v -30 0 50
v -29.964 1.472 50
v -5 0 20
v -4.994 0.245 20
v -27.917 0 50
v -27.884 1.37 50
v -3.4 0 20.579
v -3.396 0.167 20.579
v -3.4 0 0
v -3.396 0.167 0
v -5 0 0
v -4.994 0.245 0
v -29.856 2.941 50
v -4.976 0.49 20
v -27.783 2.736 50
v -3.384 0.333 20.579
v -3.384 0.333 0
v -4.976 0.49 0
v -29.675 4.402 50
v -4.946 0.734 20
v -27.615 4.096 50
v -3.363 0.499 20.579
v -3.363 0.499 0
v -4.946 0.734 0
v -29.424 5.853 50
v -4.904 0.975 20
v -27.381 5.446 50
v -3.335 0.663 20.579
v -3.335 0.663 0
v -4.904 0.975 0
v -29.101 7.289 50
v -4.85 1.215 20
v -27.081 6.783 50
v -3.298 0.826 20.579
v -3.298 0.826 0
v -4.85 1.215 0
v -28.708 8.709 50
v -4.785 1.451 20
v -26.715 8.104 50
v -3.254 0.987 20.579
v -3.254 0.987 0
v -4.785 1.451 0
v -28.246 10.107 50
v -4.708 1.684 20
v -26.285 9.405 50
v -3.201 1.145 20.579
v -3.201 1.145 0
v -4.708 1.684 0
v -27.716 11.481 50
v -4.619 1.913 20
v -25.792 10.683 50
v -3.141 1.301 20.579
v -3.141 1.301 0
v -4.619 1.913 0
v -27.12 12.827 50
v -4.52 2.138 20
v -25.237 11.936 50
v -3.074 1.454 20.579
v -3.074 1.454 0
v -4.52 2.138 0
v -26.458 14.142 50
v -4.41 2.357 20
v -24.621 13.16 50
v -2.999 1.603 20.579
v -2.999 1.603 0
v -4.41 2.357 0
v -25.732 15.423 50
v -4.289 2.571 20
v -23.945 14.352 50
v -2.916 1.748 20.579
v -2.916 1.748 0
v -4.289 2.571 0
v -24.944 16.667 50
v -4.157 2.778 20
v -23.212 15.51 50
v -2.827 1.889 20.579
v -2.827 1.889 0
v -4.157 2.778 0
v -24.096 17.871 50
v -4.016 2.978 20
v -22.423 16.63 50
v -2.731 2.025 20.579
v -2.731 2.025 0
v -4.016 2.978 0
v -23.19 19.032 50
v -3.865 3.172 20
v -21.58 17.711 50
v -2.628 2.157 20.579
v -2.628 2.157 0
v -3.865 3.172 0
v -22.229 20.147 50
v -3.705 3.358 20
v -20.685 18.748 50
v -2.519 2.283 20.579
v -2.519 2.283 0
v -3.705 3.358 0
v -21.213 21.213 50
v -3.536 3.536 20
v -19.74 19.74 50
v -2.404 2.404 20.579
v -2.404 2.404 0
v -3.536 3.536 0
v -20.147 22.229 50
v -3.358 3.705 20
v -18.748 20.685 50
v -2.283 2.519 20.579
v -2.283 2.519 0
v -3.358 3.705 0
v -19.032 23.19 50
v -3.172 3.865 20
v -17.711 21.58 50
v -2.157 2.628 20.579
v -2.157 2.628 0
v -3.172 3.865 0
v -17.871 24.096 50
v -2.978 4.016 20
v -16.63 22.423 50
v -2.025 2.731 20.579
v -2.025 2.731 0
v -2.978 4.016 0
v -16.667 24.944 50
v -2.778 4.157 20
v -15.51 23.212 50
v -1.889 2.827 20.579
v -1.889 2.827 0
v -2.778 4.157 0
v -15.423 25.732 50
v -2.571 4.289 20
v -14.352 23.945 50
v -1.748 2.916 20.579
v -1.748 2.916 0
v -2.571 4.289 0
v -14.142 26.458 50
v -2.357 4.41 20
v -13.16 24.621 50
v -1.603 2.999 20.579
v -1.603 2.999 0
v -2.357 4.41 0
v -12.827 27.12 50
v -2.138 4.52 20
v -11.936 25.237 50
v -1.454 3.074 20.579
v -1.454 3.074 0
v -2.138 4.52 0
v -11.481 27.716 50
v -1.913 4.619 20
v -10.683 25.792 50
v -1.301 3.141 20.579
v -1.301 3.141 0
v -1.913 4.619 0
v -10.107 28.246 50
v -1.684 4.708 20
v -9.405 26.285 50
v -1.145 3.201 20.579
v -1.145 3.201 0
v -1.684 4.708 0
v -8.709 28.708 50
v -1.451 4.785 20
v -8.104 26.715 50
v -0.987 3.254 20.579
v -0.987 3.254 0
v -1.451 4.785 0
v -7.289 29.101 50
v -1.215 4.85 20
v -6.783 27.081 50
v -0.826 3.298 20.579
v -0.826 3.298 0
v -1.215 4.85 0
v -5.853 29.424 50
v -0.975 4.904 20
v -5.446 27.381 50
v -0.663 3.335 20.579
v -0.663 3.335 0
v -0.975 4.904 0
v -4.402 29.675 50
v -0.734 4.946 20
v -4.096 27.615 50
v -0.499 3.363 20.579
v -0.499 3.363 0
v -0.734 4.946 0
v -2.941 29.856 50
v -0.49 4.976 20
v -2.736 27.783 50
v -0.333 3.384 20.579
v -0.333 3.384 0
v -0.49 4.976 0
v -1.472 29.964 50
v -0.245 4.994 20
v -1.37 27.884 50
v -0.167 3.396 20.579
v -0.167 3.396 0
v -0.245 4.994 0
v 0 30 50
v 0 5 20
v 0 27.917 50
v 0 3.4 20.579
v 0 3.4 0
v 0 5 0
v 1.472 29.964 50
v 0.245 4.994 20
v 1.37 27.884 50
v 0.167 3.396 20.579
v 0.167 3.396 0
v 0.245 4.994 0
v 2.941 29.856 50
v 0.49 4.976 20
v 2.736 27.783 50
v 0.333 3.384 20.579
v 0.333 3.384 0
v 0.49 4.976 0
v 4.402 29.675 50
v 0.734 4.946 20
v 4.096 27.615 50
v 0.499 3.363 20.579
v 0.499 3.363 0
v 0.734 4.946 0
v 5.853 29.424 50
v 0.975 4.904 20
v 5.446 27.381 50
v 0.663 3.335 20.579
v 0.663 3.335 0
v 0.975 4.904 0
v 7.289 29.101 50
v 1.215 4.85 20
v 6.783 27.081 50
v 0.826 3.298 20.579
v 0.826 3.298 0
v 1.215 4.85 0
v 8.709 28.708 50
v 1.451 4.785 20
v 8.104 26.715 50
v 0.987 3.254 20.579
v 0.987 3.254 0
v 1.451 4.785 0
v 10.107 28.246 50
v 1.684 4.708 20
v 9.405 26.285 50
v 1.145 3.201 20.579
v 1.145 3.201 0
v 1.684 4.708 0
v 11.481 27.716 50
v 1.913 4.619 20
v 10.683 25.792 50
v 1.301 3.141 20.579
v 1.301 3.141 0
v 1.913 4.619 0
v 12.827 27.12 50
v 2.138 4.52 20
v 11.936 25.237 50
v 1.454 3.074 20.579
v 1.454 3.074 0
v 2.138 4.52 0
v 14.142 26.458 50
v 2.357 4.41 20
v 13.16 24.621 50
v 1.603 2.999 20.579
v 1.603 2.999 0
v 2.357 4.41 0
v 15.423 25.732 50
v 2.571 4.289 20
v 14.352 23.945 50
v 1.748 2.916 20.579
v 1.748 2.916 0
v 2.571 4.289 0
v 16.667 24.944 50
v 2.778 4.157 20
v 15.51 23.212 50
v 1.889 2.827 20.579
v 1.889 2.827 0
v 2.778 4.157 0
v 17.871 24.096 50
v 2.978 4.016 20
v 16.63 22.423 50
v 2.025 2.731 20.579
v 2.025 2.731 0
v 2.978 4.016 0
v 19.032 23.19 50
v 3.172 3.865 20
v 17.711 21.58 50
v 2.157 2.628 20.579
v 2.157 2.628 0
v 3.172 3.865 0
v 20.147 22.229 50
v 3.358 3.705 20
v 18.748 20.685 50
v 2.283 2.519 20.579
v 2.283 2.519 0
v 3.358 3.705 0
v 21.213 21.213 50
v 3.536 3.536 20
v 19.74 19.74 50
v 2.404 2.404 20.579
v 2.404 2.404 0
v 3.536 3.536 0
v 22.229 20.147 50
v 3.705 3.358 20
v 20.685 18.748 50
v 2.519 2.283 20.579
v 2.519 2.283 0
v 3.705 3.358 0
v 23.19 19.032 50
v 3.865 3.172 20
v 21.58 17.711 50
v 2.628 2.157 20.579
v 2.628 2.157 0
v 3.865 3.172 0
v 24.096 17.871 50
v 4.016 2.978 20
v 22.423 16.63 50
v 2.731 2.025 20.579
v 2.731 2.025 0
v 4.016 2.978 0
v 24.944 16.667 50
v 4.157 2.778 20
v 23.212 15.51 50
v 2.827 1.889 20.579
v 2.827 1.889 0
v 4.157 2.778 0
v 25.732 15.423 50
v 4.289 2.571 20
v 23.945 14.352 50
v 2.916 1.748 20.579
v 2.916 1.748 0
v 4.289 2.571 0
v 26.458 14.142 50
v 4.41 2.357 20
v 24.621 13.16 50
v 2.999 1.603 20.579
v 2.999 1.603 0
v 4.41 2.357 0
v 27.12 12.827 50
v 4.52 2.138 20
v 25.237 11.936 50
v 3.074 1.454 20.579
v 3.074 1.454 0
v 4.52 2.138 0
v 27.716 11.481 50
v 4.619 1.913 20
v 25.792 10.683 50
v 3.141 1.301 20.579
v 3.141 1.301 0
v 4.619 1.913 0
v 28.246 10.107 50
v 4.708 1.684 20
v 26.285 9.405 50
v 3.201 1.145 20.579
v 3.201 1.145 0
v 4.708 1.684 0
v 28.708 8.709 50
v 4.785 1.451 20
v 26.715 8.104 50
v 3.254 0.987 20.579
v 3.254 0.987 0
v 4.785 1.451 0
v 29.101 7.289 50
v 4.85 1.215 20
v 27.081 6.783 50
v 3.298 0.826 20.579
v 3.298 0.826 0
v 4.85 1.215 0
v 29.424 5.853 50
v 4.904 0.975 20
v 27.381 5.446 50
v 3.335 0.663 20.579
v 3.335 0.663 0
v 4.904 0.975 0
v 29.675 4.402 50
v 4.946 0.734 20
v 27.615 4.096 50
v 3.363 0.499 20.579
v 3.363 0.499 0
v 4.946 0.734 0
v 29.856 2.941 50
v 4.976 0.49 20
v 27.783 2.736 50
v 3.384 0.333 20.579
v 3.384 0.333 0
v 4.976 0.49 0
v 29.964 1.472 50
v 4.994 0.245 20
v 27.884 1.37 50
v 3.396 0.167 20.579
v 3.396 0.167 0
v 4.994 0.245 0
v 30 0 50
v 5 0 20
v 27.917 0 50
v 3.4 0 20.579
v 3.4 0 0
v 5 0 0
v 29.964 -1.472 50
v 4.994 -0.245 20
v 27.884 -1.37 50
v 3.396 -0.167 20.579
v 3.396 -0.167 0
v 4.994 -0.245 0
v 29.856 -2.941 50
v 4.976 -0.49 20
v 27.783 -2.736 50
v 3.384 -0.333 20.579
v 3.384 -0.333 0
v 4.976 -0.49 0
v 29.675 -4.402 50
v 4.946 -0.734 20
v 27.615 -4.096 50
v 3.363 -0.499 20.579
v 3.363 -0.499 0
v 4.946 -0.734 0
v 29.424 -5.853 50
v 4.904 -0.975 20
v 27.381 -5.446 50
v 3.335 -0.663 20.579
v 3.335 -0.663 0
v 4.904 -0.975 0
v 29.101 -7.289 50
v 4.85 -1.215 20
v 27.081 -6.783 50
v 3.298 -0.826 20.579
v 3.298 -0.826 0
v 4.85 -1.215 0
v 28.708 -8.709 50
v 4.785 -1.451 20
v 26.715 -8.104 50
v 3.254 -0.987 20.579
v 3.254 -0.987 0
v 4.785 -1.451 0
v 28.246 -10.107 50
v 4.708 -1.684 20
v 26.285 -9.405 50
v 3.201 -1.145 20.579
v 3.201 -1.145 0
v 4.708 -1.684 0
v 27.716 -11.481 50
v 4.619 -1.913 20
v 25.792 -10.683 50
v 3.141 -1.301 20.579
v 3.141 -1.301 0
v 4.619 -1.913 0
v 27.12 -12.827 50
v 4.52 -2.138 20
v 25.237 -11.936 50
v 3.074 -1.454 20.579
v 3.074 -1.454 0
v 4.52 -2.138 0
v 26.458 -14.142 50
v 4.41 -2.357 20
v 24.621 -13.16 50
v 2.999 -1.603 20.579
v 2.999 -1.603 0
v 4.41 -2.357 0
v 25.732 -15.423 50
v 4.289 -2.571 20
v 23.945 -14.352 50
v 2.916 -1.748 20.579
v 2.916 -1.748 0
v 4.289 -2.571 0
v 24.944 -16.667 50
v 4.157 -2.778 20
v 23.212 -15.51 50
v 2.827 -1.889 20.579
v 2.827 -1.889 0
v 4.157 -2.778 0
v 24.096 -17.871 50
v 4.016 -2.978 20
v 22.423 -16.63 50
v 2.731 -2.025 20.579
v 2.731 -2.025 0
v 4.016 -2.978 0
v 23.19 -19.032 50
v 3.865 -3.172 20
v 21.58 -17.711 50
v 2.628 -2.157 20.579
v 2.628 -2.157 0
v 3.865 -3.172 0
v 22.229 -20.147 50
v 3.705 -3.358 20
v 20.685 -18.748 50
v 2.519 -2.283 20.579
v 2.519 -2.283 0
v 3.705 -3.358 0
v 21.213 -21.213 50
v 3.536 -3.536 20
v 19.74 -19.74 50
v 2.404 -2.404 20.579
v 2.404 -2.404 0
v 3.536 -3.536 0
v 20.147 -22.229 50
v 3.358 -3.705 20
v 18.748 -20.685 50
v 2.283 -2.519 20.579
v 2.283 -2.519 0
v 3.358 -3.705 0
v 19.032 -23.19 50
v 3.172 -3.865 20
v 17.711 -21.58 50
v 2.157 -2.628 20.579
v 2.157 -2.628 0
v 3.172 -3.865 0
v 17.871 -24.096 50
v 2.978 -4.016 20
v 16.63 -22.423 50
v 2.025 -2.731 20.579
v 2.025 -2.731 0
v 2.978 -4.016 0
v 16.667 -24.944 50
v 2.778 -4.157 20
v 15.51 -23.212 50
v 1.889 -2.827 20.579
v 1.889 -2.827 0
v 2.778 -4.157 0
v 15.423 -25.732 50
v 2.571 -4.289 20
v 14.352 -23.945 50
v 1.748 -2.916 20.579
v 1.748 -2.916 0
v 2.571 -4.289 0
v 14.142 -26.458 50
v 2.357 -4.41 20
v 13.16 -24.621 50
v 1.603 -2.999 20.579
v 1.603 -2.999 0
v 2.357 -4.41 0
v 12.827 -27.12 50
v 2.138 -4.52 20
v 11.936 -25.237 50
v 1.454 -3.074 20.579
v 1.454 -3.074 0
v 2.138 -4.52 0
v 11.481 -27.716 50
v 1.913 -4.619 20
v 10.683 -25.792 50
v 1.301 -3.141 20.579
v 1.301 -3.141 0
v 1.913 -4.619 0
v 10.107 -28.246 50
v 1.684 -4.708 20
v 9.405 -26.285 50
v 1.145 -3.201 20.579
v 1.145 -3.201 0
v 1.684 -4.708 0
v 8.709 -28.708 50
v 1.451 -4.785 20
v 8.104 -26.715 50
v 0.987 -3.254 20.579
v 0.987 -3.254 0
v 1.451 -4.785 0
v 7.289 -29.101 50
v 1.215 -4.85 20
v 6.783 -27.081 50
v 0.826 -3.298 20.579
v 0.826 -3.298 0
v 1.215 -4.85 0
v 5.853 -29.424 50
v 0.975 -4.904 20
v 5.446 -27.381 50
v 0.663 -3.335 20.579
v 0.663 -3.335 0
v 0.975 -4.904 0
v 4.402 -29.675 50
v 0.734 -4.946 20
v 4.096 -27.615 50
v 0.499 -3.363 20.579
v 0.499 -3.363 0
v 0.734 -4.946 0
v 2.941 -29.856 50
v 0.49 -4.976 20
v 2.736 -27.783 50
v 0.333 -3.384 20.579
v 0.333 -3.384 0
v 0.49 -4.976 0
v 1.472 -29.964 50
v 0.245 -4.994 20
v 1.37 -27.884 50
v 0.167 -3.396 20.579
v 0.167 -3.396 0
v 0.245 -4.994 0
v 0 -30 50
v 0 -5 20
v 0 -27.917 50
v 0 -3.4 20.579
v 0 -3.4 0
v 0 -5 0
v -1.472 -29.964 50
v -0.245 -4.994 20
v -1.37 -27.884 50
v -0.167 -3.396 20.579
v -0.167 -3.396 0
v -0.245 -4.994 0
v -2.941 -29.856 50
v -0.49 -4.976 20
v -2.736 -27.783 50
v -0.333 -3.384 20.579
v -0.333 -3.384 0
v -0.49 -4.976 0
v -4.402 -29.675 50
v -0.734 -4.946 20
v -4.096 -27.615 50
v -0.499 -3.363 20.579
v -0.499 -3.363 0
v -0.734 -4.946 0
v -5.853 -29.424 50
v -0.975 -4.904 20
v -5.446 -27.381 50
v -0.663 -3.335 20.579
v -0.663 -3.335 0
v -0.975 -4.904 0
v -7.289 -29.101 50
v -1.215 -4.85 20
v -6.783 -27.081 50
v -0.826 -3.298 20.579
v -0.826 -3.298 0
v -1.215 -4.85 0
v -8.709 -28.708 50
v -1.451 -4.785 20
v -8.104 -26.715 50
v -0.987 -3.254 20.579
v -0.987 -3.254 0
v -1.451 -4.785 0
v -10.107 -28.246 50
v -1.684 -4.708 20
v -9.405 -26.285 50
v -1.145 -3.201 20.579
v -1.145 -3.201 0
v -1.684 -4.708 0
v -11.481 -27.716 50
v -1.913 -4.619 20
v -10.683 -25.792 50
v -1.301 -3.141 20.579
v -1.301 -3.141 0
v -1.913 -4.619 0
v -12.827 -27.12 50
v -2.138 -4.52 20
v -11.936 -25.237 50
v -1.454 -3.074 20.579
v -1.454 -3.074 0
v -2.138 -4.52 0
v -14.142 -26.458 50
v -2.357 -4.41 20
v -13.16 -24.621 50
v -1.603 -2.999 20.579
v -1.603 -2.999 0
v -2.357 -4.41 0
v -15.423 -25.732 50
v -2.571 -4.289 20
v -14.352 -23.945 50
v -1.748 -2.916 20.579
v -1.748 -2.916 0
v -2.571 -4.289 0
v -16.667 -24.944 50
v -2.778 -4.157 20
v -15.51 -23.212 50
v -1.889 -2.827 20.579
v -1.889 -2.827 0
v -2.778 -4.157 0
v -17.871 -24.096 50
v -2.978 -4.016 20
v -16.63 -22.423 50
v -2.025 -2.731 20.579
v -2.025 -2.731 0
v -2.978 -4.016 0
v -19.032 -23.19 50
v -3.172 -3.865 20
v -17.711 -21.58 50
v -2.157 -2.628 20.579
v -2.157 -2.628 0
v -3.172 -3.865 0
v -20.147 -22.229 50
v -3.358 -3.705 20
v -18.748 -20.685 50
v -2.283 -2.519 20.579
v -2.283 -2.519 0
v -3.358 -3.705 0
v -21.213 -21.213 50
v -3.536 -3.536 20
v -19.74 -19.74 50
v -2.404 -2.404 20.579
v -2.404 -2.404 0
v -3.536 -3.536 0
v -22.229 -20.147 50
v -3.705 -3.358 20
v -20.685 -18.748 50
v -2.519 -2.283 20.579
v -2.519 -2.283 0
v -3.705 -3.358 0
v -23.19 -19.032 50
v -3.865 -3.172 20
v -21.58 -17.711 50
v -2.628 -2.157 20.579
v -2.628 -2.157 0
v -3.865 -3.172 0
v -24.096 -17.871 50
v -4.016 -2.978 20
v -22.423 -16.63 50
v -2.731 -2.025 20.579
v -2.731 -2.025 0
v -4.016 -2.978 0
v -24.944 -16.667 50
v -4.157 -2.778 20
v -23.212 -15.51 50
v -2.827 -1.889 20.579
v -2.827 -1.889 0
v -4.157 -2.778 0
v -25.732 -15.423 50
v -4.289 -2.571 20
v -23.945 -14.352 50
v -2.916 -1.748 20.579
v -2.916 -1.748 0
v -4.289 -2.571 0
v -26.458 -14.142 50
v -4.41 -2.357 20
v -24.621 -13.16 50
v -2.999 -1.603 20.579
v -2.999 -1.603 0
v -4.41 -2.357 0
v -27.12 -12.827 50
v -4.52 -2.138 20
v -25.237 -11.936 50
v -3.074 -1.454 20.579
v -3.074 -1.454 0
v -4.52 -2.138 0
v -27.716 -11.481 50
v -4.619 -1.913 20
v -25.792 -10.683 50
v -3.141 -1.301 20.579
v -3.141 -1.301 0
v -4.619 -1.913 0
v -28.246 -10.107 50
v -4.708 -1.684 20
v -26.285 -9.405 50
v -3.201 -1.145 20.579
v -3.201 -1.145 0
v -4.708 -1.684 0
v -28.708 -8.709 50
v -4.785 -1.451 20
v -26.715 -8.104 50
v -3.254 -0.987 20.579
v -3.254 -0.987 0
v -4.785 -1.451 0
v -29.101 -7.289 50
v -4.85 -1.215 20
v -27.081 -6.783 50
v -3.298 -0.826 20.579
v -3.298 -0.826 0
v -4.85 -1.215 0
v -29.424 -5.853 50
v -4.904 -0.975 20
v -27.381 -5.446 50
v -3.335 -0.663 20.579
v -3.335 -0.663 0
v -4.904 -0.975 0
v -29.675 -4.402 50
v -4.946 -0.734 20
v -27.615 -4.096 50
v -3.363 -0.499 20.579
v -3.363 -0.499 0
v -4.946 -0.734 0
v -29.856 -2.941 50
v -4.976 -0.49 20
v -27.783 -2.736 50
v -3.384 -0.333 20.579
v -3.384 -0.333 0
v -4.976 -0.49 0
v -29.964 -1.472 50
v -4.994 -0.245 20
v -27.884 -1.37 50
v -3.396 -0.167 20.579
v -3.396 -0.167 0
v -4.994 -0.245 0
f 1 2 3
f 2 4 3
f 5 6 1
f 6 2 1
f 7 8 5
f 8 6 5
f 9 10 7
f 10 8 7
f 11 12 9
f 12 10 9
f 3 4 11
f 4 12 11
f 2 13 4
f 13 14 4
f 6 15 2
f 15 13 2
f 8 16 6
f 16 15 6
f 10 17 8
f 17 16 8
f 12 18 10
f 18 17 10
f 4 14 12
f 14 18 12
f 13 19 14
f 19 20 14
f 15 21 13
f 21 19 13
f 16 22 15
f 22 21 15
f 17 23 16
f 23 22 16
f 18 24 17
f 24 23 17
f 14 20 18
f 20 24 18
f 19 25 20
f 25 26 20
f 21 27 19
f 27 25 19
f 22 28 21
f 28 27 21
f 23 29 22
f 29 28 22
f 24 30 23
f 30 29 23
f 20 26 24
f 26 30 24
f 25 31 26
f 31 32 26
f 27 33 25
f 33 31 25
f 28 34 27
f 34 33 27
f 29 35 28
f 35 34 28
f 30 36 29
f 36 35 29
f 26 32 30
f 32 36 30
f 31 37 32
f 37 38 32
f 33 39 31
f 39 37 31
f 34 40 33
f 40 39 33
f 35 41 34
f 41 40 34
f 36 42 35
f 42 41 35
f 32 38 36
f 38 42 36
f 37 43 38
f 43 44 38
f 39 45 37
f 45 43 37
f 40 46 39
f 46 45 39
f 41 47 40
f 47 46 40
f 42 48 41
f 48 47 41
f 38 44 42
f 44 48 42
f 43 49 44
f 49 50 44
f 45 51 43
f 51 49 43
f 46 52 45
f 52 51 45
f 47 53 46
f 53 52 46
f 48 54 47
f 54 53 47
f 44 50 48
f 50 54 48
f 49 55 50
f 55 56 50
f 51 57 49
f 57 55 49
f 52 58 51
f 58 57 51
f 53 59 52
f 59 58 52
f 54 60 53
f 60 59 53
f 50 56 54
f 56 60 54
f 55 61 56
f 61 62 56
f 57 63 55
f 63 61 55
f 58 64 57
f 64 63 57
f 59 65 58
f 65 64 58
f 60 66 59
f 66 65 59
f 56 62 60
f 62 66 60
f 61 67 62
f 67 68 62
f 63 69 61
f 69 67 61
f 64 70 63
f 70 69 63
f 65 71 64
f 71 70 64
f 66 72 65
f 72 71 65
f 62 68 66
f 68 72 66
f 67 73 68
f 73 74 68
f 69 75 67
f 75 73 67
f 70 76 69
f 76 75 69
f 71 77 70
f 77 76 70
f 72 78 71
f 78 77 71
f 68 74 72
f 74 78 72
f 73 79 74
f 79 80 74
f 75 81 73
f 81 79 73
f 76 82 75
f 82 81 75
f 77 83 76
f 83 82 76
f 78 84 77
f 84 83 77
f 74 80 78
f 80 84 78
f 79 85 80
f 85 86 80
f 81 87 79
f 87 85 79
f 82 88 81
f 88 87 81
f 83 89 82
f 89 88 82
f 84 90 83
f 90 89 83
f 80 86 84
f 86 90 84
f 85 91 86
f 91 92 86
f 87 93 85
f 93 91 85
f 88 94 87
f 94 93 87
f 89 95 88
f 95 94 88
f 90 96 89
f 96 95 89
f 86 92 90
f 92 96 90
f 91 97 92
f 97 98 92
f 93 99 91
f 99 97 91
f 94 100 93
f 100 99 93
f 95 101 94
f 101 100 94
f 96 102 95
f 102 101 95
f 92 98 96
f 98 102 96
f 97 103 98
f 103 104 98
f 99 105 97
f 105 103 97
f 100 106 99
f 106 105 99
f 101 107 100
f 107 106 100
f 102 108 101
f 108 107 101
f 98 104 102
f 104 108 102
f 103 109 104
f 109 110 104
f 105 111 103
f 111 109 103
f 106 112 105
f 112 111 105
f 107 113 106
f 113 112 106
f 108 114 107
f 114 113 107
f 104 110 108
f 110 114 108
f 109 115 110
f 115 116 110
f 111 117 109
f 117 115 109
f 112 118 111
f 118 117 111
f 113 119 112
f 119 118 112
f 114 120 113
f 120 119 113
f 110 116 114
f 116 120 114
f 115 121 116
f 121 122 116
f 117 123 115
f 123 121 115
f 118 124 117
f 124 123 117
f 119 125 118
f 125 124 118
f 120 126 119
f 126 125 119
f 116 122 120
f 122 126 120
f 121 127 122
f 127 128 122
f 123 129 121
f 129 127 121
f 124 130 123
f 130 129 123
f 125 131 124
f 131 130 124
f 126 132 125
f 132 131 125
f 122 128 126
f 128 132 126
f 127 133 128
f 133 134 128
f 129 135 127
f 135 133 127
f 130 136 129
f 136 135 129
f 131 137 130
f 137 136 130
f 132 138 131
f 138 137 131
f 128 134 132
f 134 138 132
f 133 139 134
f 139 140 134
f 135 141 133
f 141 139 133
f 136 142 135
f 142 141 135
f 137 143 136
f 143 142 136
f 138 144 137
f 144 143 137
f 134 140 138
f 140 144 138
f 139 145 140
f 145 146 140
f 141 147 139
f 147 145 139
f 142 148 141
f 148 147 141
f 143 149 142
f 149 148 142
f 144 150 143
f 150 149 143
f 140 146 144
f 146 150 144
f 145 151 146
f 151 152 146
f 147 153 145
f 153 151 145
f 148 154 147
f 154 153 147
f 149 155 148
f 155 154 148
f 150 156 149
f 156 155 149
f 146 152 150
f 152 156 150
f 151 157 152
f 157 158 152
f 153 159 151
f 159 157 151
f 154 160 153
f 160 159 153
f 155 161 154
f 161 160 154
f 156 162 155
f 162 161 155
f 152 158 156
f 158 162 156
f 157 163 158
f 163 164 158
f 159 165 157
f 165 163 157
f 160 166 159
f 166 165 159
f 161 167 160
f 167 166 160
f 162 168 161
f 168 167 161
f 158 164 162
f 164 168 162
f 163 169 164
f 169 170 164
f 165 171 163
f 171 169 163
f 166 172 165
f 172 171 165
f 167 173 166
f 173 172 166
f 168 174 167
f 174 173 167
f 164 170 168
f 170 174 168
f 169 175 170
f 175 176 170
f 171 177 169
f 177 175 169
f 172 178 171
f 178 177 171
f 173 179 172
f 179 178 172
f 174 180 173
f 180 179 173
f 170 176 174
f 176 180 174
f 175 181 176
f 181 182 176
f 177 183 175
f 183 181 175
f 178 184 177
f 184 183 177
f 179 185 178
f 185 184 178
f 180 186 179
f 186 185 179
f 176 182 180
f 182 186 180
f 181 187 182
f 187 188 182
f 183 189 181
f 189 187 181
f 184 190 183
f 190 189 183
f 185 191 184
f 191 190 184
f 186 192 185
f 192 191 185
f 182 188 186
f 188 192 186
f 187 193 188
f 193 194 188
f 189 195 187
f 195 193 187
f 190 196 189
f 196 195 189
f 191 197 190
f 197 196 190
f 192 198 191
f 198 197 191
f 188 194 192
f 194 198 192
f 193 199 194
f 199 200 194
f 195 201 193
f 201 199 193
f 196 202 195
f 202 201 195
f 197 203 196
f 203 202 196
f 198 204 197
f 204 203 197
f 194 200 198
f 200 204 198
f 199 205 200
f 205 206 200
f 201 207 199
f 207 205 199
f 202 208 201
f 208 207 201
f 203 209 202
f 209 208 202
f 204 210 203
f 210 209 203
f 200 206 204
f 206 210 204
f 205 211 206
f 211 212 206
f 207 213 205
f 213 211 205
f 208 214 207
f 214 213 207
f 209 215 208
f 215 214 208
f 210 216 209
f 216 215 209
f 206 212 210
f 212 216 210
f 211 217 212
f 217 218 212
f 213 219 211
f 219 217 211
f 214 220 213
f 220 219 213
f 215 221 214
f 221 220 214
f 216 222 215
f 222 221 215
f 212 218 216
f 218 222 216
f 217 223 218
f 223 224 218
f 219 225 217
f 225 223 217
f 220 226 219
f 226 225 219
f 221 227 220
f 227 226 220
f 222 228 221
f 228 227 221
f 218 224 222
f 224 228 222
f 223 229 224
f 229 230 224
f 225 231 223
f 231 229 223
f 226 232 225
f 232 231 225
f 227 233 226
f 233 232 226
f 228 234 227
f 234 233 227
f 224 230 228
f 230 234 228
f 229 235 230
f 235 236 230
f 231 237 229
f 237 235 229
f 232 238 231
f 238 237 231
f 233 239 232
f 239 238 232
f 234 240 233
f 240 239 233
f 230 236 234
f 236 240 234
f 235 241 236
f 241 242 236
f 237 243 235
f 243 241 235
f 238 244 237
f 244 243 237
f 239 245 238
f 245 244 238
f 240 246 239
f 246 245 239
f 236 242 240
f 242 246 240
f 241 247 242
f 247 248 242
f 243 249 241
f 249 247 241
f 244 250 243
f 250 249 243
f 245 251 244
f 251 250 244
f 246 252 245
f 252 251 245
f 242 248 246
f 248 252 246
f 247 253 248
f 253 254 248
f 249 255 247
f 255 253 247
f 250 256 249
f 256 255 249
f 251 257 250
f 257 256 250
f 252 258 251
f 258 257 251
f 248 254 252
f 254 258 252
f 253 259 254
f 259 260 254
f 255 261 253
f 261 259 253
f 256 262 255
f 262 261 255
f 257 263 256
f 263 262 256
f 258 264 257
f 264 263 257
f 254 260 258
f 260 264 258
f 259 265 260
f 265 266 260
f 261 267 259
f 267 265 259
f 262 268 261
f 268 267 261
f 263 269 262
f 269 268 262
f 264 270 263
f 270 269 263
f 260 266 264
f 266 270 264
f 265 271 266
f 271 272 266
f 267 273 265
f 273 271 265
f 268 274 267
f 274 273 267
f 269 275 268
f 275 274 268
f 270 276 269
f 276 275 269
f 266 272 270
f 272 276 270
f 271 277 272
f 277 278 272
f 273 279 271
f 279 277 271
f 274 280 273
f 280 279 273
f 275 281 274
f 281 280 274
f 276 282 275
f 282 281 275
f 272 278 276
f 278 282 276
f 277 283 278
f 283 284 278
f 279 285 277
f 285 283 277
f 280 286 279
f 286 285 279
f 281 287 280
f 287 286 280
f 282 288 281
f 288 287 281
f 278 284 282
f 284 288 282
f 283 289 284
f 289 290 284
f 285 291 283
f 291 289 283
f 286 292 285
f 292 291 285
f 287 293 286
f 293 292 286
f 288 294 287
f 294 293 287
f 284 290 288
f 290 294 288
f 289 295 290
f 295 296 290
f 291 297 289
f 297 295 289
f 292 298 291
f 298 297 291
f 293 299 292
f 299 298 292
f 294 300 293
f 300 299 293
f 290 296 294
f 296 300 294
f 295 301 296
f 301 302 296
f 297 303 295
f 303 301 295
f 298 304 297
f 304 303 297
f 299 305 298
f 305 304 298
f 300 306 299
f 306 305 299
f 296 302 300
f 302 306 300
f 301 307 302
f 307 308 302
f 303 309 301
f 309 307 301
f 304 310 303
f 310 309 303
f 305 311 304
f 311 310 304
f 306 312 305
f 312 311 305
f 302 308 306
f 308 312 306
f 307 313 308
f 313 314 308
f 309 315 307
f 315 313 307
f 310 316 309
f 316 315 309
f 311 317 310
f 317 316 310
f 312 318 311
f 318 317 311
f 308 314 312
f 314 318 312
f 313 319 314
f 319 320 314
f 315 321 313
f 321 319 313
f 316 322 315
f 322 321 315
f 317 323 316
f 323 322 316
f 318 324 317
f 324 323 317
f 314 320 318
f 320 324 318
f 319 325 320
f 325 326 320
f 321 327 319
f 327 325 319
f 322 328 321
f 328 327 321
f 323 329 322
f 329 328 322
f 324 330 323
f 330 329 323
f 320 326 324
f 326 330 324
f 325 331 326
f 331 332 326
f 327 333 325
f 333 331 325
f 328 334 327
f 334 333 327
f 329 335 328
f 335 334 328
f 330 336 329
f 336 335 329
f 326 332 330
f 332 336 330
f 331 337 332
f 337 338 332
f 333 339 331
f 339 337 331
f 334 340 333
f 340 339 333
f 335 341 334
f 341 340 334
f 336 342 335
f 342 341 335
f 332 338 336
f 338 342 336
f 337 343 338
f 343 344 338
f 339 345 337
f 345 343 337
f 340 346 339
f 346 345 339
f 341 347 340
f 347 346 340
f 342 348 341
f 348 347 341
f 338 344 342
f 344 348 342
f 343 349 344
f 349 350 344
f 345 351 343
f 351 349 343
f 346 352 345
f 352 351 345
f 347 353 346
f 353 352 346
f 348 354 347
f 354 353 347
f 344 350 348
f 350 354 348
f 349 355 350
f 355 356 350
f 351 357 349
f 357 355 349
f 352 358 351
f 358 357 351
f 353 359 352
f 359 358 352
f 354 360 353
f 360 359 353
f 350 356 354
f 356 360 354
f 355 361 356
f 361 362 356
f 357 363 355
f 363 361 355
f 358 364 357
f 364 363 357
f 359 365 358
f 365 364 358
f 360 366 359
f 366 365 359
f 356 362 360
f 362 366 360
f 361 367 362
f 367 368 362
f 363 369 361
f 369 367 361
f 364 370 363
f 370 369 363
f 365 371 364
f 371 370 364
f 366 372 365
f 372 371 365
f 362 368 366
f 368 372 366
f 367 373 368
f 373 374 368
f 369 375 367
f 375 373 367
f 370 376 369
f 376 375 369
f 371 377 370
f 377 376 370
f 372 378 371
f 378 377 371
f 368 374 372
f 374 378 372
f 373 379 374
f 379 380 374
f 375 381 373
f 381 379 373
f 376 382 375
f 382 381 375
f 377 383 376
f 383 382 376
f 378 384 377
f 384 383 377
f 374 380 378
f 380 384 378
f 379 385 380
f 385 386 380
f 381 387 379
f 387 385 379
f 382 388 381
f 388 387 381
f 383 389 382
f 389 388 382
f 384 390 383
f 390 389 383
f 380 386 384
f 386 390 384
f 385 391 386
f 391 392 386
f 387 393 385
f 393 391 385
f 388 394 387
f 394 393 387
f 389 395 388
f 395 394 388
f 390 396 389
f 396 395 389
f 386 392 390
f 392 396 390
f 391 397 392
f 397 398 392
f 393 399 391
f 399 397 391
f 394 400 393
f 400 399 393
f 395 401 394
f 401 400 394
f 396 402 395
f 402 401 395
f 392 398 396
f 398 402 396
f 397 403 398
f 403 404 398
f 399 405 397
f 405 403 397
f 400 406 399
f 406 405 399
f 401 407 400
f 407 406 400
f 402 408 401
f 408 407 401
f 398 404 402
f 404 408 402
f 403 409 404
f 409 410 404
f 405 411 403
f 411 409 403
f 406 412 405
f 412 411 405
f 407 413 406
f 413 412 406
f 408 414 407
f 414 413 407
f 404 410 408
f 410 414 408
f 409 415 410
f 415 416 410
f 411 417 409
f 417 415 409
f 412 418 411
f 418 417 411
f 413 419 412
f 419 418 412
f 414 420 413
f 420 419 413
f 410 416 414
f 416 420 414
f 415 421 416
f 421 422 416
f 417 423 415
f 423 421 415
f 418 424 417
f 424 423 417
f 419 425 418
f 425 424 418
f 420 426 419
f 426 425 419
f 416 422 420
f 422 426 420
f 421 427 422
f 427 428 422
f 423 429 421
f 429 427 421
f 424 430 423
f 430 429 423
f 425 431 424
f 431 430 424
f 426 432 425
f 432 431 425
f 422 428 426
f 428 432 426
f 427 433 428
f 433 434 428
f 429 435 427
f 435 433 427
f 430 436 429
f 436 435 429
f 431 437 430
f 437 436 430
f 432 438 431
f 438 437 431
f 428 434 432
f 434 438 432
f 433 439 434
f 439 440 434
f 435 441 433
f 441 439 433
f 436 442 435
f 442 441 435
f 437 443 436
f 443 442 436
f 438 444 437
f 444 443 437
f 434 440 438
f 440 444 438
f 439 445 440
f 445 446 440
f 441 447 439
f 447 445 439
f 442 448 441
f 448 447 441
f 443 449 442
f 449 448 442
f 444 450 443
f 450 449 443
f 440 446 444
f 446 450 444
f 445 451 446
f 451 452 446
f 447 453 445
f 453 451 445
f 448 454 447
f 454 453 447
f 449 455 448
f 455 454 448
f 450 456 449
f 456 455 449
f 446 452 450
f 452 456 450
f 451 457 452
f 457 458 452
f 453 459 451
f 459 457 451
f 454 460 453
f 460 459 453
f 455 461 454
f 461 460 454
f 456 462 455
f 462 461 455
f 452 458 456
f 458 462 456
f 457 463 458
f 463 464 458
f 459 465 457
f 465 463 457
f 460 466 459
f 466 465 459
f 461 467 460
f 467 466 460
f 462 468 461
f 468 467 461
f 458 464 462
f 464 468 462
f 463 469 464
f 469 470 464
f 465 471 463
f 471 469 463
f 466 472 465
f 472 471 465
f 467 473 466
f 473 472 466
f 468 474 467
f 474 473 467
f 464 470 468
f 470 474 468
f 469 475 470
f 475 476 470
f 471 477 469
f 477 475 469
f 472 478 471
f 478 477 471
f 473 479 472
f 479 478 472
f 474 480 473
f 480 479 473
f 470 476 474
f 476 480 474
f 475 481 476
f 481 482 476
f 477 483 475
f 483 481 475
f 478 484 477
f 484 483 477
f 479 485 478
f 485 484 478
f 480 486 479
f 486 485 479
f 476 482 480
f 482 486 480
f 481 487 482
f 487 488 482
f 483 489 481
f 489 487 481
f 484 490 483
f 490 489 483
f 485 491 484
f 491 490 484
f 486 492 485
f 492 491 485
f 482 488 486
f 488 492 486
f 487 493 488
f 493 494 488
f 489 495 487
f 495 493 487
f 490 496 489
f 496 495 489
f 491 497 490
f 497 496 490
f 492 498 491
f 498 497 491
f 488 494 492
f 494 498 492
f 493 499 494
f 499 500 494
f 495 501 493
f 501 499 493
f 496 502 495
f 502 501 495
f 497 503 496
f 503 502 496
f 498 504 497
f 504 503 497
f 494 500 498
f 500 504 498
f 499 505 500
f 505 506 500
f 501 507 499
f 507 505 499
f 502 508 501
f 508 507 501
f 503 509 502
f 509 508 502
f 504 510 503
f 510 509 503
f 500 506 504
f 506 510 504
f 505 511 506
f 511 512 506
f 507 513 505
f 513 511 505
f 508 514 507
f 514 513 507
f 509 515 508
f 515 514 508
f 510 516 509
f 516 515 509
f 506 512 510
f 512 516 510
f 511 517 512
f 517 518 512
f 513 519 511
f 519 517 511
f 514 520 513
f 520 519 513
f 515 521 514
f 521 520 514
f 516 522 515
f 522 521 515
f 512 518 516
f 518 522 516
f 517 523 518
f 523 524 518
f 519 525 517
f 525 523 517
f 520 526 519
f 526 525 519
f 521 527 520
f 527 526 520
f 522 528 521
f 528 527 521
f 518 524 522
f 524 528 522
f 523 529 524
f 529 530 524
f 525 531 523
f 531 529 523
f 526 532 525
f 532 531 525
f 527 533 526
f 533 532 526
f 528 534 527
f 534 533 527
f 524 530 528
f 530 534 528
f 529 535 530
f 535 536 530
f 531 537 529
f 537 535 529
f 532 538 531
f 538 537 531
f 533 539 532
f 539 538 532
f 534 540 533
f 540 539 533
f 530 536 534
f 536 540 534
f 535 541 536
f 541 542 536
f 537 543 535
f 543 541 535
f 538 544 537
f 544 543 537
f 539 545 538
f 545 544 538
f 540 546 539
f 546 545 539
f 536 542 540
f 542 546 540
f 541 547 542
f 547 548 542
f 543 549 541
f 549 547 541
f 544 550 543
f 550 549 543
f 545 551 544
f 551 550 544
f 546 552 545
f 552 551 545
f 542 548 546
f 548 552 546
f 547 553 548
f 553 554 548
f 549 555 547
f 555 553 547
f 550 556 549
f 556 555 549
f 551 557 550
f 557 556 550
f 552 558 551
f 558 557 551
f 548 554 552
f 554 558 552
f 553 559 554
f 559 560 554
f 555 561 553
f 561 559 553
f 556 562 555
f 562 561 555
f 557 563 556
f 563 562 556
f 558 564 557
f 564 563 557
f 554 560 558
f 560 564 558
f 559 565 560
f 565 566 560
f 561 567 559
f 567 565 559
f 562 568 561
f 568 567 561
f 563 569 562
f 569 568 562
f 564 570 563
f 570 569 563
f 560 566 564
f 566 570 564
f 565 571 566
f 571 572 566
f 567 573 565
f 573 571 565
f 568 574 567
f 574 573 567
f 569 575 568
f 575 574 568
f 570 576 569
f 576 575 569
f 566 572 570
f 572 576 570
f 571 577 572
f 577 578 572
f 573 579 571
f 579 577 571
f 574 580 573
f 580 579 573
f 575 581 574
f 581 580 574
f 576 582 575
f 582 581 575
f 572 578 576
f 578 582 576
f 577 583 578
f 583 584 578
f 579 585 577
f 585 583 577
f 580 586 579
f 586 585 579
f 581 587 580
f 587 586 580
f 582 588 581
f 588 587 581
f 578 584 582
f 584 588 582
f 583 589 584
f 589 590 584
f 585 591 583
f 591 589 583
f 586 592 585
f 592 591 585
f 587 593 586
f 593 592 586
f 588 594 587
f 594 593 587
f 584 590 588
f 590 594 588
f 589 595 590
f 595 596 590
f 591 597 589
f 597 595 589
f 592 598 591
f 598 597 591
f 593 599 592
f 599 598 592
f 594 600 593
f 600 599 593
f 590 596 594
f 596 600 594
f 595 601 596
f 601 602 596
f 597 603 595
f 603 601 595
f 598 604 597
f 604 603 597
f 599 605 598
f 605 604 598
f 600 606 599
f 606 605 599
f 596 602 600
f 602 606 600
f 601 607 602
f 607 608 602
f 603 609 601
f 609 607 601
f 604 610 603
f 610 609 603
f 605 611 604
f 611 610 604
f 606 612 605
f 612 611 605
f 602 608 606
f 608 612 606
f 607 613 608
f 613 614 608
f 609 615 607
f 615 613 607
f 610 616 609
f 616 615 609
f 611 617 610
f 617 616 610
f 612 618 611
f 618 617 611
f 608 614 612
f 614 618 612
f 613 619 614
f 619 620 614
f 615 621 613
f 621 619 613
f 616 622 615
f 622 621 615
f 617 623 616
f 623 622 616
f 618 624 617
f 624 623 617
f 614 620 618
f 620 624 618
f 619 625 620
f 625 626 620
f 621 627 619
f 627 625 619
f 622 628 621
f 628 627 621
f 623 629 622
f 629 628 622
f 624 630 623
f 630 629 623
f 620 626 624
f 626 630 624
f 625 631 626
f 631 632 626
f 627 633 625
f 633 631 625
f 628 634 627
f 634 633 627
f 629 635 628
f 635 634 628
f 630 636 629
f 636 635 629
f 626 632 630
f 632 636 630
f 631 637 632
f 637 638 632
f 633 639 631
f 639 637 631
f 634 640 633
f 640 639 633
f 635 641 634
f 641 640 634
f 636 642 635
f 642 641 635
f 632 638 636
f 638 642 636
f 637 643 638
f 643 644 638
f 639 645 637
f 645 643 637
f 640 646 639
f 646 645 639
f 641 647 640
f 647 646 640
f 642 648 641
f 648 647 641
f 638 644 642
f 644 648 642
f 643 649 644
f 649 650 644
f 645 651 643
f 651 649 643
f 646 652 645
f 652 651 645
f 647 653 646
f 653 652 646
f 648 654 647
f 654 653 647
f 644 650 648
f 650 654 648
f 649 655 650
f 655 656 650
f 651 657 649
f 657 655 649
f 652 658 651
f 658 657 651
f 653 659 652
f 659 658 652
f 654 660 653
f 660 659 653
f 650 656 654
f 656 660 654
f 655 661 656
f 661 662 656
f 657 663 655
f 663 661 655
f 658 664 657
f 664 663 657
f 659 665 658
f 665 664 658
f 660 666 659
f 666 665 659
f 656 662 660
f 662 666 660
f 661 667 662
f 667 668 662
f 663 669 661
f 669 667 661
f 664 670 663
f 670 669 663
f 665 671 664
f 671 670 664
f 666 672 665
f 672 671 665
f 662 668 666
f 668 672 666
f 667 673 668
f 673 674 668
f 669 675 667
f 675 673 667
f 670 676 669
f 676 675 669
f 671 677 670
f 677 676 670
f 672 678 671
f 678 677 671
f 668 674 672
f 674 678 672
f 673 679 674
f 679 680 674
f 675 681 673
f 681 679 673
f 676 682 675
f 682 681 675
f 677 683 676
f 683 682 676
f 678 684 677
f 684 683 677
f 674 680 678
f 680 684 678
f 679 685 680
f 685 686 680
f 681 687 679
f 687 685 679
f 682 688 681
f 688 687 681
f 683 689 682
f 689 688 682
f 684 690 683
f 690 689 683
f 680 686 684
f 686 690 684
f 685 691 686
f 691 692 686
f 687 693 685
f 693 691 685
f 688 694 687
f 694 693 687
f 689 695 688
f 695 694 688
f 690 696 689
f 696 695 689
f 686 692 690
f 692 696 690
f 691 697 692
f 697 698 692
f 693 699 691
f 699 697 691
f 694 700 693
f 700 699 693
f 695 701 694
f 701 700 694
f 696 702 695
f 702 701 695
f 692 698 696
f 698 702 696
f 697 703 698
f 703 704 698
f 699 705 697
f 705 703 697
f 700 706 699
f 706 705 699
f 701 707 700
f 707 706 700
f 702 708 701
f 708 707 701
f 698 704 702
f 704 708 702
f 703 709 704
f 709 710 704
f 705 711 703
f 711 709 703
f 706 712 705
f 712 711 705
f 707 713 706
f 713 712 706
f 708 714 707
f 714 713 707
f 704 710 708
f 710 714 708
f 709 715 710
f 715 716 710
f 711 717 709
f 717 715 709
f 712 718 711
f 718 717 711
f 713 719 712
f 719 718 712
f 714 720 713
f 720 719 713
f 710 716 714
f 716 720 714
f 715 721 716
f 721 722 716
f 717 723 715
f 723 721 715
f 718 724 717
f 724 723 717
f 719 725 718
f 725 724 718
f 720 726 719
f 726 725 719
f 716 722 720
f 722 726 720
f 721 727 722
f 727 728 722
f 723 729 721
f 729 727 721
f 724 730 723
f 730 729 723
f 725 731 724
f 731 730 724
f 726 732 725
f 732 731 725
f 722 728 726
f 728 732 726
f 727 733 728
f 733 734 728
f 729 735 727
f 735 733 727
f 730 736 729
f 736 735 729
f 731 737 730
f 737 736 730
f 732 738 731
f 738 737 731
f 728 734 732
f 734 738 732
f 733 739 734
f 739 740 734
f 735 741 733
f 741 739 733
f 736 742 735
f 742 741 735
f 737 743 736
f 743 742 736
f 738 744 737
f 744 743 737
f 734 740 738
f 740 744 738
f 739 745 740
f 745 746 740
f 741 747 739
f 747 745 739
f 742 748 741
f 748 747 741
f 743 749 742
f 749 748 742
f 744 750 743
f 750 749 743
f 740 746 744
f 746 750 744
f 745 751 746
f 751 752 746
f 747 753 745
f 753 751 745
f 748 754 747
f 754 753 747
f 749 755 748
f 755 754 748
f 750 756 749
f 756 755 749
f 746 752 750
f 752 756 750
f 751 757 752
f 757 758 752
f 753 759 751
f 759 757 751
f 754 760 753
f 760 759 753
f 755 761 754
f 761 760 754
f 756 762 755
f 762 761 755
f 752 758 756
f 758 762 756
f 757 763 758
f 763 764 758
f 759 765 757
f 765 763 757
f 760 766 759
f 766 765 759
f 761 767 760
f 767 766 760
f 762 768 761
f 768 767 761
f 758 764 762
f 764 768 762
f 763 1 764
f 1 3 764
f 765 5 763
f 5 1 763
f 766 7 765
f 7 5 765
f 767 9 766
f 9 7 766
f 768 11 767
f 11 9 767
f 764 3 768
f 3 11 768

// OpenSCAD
// Small lab funnel - printed upright, wide opening at top
// Built as a single rotate_extrude of the wall cross-section,
// so the funnel is open at both ends.

$fn = 128;                 // smoothness of round surfaces

// ---------------- Dimensions (mm) ----------------
spout_od      = 10;        // spout outer diameter
spout_h       = 20;        // spout height (z = 0 .. 20)
rim_od        = 60;        // cone outer diameter at rim
total_h       = 50;        // rim height (top of funnel)
wall          = 1.6;       // wall thickness (normal to surface)

// ---------------- Derived values ----------------
spout_r       = spout_od / 2;                 // 5.0  outer spout radius
bore_r        = spout_r - wall;               // 3.4  spout bore radius (6.8 mm bore)
rim_r         = rim_od / 2;                   // 30.0 outer rim radius
cone_h        = total_h - spout_h;            // 30.0 cone height
cone_k        = (rim_r - spout_r) / cone_h;   // radial growth per mm of height
// Horizontal offset that gives a true 1.6 mm wall perpendicular to the cone side
cone_off      = wall * sqrt(1 + cone_k * cone_k);
// Height where the inner cone surface meets the spout bore
join_z        = spout_h + (cone_off - wall) / cone_k;
rim_inner_r   = rim_r - cone_off;             // inner radius at rim

// ---------------- Model ----------------
rotate_extrude(convexity = 4)
    polygon(points = [
        [bore_r,      0],        // bottom of bore
        [spout_r,     0],        // bottom outer edge of spout
        [spout_r,     spout_h],  // top of straight spout (outer)
        [rim_r,       total_h],  // outer rim
        [rim_inner_r, total_h],  // inner rim
        [bore_r,      join_z]    // inner cone meets bore
    ]);
